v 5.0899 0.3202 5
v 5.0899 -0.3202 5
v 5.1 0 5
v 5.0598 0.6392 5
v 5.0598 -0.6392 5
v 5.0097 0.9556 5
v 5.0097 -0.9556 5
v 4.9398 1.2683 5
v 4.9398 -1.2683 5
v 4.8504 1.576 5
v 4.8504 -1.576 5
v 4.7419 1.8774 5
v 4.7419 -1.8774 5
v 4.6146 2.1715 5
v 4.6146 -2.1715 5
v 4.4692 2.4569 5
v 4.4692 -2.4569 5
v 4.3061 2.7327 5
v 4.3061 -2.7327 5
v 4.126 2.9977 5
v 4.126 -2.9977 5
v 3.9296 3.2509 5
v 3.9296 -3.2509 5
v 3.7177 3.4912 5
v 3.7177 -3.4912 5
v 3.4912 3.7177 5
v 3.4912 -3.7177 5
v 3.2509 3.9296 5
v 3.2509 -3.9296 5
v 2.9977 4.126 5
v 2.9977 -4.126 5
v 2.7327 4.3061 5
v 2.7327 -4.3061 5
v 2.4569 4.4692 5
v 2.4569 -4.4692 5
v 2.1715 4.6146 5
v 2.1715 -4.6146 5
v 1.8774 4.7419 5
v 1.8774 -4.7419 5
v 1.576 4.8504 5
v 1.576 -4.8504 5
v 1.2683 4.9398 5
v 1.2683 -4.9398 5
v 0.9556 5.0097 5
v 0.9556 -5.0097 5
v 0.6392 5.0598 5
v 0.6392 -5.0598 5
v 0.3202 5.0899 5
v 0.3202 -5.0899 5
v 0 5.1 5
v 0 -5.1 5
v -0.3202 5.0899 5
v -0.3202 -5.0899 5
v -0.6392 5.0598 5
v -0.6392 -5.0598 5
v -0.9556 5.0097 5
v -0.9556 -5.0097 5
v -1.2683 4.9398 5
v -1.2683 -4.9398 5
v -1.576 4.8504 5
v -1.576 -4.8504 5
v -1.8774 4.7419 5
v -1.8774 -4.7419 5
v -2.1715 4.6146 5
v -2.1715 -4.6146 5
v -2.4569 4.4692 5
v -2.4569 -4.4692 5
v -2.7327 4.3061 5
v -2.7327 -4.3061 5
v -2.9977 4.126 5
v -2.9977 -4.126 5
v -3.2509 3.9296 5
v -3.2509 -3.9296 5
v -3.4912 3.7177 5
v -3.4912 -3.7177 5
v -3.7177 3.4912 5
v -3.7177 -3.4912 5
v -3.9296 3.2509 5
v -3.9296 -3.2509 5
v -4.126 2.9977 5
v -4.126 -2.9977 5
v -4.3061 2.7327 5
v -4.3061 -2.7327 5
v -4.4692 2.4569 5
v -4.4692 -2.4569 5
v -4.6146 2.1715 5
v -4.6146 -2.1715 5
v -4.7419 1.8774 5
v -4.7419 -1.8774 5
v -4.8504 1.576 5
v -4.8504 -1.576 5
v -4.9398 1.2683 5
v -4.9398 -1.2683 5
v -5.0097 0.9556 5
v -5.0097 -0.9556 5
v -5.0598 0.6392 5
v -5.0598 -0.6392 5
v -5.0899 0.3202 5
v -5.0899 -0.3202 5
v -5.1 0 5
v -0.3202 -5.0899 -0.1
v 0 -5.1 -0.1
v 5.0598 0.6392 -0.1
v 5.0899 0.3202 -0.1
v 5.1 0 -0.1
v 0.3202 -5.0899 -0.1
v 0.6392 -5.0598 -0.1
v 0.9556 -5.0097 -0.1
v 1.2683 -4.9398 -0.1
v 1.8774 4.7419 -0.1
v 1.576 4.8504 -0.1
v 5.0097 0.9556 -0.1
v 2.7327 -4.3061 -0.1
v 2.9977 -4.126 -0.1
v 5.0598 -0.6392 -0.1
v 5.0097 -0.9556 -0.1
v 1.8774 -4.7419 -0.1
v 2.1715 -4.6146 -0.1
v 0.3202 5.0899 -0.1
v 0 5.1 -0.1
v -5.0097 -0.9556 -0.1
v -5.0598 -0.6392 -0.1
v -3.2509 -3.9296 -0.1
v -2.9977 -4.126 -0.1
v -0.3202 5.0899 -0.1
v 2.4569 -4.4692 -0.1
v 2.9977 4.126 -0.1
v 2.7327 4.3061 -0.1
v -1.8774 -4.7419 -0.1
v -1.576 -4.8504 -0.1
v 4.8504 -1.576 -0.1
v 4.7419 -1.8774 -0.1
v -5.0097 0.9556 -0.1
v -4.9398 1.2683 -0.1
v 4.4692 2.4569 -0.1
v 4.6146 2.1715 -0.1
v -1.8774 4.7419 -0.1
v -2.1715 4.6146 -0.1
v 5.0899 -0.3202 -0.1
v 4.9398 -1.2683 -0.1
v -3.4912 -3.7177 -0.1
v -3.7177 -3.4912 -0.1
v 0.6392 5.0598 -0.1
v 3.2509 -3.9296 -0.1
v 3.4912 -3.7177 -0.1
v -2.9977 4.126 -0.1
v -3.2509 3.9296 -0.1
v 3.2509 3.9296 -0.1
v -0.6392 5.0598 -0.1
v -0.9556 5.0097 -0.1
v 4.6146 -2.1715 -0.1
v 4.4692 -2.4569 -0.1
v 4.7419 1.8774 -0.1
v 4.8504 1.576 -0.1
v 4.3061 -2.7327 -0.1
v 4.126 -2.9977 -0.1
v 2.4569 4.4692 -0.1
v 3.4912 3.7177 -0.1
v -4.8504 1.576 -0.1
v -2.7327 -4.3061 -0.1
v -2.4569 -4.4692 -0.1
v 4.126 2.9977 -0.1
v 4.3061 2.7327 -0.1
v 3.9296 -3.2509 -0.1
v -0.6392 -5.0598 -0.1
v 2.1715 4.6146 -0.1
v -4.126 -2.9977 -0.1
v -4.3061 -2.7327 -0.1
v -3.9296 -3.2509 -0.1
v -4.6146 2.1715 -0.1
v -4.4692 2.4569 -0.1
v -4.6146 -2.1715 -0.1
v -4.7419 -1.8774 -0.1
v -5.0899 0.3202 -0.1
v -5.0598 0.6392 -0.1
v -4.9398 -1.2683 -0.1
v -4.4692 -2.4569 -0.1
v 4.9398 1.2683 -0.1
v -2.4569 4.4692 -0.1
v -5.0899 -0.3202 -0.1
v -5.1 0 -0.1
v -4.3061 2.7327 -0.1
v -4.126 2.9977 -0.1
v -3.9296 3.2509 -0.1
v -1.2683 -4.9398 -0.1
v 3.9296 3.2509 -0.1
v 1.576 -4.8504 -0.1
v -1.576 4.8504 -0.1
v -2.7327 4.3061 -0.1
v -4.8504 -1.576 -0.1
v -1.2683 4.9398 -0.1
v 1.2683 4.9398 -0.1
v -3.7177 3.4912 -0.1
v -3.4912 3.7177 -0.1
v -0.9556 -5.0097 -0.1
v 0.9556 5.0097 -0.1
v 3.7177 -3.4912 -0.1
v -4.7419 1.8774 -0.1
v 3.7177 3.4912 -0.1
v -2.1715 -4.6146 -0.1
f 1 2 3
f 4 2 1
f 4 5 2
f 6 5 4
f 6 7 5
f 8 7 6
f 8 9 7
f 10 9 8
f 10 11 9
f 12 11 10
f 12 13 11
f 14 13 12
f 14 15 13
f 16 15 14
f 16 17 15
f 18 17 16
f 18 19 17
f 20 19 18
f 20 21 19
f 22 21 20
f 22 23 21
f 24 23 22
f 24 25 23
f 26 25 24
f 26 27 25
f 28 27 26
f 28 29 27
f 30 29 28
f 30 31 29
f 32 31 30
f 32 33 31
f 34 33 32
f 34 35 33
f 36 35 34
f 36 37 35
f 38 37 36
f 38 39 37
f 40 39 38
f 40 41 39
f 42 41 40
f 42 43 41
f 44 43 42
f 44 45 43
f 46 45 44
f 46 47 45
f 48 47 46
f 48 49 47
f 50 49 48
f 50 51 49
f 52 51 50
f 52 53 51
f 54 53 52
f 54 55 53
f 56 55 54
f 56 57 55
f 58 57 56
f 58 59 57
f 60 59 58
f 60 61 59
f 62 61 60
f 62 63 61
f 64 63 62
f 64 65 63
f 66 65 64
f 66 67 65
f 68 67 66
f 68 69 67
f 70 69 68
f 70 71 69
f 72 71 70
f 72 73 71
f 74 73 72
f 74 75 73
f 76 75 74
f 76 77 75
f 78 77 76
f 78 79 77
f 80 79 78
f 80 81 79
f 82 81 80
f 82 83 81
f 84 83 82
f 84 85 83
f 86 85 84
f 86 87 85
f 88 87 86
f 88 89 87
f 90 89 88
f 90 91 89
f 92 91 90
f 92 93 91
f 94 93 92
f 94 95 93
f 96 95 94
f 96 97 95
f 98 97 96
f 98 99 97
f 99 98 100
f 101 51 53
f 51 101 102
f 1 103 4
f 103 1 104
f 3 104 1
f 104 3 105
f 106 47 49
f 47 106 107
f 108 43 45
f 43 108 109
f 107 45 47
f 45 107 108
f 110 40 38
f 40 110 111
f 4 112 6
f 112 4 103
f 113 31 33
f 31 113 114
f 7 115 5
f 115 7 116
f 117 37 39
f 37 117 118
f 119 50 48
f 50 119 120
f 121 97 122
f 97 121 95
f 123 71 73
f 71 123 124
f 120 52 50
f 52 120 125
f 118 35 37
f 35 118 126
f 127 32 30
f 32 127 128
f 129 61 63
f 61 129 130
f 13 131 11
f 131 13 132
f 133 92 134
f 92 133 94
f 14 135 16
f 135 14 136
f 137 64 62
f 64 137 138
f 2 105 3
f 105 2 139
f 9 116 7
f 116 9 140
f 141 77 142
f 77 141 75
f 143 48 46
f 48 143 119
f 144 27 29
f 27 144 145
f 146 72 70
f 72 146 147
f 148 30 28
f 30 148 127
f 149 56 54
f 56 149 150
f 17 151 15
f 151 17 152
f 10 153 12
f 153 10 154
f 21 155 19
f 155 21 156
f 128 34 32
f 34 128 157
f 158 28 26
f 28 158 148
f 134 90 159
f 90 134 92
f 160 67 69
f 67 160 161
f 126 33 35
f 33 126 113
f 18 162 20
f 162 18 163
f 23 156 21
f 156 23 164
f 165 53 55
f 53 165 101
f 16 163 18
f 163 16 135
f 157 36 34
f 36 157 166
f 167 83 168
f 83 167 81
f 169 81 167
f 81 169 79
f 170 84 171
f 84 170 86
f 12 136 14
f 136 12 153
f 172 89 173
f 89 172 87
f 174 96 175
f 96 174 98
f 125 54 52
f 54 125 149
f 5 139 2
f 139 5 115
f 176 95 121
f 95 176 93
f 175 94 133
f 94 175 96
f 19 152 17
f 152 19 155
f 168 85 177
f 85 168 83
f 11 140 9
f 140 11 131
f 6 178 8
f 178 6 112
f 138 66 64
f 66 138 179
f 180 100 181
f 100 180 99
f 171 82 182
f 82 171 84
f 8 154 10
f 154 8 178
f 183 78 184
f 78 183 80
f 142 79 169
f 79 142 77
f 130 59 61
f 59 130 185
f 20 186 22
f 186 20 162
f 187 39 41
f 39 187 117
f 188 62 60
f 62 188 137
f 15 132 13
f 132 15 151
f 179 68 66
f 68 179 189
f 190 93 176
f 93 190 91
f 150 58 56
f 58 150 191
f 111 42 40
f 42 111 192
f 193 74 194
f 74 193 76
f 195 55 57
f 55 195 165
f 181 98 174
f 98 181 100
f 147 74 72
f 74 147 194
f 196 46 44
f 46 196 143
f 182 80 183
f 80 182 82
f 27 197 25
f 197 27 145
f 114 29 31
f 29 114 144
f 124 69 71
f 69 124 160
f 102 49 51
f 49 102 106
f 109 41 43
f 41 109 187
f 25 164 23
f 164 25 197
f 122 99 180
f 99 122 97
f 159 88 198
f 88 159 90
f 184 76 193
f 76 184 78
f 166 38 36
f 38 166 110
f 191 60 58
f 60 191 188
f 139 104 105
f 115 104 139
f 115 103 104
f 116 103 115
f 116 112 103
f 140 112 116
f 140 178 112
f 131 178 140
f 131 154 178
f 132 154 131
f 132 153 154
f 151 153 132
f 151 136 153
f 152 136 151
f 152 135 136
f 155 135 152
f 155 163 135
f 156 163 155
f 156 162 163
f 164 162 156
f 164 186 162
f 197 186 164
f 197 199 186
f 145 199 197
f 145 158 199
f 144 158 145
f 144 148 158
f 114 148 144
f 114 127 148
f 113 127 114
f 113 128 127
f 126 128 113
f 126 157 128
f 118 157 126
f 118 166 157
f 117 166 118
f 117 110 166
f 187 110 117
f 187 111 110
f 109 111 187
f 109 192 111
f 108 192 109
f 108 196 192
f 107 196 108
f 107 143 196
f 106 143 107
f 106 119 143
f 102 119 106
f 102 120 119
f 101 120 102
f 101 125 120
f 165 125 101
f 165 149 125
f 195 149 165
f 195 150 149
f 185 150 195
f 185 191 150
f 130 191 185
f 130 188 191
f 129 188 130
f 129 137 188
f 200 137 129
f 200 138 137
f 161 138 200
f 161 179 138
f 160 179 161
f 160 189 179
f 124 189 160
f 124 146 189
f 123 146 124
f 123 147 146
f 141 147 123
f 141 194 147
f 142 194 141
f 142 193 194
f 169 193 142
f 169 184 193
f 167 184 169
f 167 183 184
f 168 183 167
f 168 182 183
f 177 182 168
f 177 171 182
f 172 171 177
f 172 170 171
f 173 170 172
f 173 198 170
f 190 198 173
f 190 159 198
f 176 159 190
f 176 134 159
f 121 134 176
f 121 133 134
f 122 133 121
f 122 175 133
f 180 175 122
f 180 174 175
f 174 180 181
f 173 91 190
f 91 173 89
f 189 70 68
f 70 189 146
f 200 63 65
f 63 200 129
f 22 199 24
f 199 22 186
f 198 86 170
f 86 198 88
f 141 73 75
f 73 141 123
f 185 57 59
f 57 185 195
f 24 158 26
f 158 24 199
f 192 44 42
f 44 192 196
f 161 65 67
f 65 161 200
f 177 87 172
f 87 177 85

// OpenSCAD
/* 
	Supplemental Valve 1

*/

$fn = 100; // increase the smoothness of the cylinders
 
// Define the dimensions
valve_diameter = 10; // Diameter of the valve
membrane_thickness = 0.1; // 100 microns
valve_height = 5; // Height of the valve
port_diameter = 2; // Diameter of the ports
port_offset = valve_diameter / 4; // Offset of the ports
 
// Draw the pneumatic chamber
cylinder(h=valve_height, d=valve_diameter);
 
// Draw the fluid chamber with membrane
translate([0, 0, -membrane_thickness])
    cylinder(h=valve_height + membrane_thickness, d=valve_diameter + 2 * membrane_thickness);
 
// Draw the two offset ports
translate([port_offset, 0, -membrane_thickness])
    cylinder(h=valve_height / 2, d=port_diameter);
 
translate([-port_offset, 0, -membrane_thickness])
    cylinder(h=valve_height / 2, d=port_diameter);
